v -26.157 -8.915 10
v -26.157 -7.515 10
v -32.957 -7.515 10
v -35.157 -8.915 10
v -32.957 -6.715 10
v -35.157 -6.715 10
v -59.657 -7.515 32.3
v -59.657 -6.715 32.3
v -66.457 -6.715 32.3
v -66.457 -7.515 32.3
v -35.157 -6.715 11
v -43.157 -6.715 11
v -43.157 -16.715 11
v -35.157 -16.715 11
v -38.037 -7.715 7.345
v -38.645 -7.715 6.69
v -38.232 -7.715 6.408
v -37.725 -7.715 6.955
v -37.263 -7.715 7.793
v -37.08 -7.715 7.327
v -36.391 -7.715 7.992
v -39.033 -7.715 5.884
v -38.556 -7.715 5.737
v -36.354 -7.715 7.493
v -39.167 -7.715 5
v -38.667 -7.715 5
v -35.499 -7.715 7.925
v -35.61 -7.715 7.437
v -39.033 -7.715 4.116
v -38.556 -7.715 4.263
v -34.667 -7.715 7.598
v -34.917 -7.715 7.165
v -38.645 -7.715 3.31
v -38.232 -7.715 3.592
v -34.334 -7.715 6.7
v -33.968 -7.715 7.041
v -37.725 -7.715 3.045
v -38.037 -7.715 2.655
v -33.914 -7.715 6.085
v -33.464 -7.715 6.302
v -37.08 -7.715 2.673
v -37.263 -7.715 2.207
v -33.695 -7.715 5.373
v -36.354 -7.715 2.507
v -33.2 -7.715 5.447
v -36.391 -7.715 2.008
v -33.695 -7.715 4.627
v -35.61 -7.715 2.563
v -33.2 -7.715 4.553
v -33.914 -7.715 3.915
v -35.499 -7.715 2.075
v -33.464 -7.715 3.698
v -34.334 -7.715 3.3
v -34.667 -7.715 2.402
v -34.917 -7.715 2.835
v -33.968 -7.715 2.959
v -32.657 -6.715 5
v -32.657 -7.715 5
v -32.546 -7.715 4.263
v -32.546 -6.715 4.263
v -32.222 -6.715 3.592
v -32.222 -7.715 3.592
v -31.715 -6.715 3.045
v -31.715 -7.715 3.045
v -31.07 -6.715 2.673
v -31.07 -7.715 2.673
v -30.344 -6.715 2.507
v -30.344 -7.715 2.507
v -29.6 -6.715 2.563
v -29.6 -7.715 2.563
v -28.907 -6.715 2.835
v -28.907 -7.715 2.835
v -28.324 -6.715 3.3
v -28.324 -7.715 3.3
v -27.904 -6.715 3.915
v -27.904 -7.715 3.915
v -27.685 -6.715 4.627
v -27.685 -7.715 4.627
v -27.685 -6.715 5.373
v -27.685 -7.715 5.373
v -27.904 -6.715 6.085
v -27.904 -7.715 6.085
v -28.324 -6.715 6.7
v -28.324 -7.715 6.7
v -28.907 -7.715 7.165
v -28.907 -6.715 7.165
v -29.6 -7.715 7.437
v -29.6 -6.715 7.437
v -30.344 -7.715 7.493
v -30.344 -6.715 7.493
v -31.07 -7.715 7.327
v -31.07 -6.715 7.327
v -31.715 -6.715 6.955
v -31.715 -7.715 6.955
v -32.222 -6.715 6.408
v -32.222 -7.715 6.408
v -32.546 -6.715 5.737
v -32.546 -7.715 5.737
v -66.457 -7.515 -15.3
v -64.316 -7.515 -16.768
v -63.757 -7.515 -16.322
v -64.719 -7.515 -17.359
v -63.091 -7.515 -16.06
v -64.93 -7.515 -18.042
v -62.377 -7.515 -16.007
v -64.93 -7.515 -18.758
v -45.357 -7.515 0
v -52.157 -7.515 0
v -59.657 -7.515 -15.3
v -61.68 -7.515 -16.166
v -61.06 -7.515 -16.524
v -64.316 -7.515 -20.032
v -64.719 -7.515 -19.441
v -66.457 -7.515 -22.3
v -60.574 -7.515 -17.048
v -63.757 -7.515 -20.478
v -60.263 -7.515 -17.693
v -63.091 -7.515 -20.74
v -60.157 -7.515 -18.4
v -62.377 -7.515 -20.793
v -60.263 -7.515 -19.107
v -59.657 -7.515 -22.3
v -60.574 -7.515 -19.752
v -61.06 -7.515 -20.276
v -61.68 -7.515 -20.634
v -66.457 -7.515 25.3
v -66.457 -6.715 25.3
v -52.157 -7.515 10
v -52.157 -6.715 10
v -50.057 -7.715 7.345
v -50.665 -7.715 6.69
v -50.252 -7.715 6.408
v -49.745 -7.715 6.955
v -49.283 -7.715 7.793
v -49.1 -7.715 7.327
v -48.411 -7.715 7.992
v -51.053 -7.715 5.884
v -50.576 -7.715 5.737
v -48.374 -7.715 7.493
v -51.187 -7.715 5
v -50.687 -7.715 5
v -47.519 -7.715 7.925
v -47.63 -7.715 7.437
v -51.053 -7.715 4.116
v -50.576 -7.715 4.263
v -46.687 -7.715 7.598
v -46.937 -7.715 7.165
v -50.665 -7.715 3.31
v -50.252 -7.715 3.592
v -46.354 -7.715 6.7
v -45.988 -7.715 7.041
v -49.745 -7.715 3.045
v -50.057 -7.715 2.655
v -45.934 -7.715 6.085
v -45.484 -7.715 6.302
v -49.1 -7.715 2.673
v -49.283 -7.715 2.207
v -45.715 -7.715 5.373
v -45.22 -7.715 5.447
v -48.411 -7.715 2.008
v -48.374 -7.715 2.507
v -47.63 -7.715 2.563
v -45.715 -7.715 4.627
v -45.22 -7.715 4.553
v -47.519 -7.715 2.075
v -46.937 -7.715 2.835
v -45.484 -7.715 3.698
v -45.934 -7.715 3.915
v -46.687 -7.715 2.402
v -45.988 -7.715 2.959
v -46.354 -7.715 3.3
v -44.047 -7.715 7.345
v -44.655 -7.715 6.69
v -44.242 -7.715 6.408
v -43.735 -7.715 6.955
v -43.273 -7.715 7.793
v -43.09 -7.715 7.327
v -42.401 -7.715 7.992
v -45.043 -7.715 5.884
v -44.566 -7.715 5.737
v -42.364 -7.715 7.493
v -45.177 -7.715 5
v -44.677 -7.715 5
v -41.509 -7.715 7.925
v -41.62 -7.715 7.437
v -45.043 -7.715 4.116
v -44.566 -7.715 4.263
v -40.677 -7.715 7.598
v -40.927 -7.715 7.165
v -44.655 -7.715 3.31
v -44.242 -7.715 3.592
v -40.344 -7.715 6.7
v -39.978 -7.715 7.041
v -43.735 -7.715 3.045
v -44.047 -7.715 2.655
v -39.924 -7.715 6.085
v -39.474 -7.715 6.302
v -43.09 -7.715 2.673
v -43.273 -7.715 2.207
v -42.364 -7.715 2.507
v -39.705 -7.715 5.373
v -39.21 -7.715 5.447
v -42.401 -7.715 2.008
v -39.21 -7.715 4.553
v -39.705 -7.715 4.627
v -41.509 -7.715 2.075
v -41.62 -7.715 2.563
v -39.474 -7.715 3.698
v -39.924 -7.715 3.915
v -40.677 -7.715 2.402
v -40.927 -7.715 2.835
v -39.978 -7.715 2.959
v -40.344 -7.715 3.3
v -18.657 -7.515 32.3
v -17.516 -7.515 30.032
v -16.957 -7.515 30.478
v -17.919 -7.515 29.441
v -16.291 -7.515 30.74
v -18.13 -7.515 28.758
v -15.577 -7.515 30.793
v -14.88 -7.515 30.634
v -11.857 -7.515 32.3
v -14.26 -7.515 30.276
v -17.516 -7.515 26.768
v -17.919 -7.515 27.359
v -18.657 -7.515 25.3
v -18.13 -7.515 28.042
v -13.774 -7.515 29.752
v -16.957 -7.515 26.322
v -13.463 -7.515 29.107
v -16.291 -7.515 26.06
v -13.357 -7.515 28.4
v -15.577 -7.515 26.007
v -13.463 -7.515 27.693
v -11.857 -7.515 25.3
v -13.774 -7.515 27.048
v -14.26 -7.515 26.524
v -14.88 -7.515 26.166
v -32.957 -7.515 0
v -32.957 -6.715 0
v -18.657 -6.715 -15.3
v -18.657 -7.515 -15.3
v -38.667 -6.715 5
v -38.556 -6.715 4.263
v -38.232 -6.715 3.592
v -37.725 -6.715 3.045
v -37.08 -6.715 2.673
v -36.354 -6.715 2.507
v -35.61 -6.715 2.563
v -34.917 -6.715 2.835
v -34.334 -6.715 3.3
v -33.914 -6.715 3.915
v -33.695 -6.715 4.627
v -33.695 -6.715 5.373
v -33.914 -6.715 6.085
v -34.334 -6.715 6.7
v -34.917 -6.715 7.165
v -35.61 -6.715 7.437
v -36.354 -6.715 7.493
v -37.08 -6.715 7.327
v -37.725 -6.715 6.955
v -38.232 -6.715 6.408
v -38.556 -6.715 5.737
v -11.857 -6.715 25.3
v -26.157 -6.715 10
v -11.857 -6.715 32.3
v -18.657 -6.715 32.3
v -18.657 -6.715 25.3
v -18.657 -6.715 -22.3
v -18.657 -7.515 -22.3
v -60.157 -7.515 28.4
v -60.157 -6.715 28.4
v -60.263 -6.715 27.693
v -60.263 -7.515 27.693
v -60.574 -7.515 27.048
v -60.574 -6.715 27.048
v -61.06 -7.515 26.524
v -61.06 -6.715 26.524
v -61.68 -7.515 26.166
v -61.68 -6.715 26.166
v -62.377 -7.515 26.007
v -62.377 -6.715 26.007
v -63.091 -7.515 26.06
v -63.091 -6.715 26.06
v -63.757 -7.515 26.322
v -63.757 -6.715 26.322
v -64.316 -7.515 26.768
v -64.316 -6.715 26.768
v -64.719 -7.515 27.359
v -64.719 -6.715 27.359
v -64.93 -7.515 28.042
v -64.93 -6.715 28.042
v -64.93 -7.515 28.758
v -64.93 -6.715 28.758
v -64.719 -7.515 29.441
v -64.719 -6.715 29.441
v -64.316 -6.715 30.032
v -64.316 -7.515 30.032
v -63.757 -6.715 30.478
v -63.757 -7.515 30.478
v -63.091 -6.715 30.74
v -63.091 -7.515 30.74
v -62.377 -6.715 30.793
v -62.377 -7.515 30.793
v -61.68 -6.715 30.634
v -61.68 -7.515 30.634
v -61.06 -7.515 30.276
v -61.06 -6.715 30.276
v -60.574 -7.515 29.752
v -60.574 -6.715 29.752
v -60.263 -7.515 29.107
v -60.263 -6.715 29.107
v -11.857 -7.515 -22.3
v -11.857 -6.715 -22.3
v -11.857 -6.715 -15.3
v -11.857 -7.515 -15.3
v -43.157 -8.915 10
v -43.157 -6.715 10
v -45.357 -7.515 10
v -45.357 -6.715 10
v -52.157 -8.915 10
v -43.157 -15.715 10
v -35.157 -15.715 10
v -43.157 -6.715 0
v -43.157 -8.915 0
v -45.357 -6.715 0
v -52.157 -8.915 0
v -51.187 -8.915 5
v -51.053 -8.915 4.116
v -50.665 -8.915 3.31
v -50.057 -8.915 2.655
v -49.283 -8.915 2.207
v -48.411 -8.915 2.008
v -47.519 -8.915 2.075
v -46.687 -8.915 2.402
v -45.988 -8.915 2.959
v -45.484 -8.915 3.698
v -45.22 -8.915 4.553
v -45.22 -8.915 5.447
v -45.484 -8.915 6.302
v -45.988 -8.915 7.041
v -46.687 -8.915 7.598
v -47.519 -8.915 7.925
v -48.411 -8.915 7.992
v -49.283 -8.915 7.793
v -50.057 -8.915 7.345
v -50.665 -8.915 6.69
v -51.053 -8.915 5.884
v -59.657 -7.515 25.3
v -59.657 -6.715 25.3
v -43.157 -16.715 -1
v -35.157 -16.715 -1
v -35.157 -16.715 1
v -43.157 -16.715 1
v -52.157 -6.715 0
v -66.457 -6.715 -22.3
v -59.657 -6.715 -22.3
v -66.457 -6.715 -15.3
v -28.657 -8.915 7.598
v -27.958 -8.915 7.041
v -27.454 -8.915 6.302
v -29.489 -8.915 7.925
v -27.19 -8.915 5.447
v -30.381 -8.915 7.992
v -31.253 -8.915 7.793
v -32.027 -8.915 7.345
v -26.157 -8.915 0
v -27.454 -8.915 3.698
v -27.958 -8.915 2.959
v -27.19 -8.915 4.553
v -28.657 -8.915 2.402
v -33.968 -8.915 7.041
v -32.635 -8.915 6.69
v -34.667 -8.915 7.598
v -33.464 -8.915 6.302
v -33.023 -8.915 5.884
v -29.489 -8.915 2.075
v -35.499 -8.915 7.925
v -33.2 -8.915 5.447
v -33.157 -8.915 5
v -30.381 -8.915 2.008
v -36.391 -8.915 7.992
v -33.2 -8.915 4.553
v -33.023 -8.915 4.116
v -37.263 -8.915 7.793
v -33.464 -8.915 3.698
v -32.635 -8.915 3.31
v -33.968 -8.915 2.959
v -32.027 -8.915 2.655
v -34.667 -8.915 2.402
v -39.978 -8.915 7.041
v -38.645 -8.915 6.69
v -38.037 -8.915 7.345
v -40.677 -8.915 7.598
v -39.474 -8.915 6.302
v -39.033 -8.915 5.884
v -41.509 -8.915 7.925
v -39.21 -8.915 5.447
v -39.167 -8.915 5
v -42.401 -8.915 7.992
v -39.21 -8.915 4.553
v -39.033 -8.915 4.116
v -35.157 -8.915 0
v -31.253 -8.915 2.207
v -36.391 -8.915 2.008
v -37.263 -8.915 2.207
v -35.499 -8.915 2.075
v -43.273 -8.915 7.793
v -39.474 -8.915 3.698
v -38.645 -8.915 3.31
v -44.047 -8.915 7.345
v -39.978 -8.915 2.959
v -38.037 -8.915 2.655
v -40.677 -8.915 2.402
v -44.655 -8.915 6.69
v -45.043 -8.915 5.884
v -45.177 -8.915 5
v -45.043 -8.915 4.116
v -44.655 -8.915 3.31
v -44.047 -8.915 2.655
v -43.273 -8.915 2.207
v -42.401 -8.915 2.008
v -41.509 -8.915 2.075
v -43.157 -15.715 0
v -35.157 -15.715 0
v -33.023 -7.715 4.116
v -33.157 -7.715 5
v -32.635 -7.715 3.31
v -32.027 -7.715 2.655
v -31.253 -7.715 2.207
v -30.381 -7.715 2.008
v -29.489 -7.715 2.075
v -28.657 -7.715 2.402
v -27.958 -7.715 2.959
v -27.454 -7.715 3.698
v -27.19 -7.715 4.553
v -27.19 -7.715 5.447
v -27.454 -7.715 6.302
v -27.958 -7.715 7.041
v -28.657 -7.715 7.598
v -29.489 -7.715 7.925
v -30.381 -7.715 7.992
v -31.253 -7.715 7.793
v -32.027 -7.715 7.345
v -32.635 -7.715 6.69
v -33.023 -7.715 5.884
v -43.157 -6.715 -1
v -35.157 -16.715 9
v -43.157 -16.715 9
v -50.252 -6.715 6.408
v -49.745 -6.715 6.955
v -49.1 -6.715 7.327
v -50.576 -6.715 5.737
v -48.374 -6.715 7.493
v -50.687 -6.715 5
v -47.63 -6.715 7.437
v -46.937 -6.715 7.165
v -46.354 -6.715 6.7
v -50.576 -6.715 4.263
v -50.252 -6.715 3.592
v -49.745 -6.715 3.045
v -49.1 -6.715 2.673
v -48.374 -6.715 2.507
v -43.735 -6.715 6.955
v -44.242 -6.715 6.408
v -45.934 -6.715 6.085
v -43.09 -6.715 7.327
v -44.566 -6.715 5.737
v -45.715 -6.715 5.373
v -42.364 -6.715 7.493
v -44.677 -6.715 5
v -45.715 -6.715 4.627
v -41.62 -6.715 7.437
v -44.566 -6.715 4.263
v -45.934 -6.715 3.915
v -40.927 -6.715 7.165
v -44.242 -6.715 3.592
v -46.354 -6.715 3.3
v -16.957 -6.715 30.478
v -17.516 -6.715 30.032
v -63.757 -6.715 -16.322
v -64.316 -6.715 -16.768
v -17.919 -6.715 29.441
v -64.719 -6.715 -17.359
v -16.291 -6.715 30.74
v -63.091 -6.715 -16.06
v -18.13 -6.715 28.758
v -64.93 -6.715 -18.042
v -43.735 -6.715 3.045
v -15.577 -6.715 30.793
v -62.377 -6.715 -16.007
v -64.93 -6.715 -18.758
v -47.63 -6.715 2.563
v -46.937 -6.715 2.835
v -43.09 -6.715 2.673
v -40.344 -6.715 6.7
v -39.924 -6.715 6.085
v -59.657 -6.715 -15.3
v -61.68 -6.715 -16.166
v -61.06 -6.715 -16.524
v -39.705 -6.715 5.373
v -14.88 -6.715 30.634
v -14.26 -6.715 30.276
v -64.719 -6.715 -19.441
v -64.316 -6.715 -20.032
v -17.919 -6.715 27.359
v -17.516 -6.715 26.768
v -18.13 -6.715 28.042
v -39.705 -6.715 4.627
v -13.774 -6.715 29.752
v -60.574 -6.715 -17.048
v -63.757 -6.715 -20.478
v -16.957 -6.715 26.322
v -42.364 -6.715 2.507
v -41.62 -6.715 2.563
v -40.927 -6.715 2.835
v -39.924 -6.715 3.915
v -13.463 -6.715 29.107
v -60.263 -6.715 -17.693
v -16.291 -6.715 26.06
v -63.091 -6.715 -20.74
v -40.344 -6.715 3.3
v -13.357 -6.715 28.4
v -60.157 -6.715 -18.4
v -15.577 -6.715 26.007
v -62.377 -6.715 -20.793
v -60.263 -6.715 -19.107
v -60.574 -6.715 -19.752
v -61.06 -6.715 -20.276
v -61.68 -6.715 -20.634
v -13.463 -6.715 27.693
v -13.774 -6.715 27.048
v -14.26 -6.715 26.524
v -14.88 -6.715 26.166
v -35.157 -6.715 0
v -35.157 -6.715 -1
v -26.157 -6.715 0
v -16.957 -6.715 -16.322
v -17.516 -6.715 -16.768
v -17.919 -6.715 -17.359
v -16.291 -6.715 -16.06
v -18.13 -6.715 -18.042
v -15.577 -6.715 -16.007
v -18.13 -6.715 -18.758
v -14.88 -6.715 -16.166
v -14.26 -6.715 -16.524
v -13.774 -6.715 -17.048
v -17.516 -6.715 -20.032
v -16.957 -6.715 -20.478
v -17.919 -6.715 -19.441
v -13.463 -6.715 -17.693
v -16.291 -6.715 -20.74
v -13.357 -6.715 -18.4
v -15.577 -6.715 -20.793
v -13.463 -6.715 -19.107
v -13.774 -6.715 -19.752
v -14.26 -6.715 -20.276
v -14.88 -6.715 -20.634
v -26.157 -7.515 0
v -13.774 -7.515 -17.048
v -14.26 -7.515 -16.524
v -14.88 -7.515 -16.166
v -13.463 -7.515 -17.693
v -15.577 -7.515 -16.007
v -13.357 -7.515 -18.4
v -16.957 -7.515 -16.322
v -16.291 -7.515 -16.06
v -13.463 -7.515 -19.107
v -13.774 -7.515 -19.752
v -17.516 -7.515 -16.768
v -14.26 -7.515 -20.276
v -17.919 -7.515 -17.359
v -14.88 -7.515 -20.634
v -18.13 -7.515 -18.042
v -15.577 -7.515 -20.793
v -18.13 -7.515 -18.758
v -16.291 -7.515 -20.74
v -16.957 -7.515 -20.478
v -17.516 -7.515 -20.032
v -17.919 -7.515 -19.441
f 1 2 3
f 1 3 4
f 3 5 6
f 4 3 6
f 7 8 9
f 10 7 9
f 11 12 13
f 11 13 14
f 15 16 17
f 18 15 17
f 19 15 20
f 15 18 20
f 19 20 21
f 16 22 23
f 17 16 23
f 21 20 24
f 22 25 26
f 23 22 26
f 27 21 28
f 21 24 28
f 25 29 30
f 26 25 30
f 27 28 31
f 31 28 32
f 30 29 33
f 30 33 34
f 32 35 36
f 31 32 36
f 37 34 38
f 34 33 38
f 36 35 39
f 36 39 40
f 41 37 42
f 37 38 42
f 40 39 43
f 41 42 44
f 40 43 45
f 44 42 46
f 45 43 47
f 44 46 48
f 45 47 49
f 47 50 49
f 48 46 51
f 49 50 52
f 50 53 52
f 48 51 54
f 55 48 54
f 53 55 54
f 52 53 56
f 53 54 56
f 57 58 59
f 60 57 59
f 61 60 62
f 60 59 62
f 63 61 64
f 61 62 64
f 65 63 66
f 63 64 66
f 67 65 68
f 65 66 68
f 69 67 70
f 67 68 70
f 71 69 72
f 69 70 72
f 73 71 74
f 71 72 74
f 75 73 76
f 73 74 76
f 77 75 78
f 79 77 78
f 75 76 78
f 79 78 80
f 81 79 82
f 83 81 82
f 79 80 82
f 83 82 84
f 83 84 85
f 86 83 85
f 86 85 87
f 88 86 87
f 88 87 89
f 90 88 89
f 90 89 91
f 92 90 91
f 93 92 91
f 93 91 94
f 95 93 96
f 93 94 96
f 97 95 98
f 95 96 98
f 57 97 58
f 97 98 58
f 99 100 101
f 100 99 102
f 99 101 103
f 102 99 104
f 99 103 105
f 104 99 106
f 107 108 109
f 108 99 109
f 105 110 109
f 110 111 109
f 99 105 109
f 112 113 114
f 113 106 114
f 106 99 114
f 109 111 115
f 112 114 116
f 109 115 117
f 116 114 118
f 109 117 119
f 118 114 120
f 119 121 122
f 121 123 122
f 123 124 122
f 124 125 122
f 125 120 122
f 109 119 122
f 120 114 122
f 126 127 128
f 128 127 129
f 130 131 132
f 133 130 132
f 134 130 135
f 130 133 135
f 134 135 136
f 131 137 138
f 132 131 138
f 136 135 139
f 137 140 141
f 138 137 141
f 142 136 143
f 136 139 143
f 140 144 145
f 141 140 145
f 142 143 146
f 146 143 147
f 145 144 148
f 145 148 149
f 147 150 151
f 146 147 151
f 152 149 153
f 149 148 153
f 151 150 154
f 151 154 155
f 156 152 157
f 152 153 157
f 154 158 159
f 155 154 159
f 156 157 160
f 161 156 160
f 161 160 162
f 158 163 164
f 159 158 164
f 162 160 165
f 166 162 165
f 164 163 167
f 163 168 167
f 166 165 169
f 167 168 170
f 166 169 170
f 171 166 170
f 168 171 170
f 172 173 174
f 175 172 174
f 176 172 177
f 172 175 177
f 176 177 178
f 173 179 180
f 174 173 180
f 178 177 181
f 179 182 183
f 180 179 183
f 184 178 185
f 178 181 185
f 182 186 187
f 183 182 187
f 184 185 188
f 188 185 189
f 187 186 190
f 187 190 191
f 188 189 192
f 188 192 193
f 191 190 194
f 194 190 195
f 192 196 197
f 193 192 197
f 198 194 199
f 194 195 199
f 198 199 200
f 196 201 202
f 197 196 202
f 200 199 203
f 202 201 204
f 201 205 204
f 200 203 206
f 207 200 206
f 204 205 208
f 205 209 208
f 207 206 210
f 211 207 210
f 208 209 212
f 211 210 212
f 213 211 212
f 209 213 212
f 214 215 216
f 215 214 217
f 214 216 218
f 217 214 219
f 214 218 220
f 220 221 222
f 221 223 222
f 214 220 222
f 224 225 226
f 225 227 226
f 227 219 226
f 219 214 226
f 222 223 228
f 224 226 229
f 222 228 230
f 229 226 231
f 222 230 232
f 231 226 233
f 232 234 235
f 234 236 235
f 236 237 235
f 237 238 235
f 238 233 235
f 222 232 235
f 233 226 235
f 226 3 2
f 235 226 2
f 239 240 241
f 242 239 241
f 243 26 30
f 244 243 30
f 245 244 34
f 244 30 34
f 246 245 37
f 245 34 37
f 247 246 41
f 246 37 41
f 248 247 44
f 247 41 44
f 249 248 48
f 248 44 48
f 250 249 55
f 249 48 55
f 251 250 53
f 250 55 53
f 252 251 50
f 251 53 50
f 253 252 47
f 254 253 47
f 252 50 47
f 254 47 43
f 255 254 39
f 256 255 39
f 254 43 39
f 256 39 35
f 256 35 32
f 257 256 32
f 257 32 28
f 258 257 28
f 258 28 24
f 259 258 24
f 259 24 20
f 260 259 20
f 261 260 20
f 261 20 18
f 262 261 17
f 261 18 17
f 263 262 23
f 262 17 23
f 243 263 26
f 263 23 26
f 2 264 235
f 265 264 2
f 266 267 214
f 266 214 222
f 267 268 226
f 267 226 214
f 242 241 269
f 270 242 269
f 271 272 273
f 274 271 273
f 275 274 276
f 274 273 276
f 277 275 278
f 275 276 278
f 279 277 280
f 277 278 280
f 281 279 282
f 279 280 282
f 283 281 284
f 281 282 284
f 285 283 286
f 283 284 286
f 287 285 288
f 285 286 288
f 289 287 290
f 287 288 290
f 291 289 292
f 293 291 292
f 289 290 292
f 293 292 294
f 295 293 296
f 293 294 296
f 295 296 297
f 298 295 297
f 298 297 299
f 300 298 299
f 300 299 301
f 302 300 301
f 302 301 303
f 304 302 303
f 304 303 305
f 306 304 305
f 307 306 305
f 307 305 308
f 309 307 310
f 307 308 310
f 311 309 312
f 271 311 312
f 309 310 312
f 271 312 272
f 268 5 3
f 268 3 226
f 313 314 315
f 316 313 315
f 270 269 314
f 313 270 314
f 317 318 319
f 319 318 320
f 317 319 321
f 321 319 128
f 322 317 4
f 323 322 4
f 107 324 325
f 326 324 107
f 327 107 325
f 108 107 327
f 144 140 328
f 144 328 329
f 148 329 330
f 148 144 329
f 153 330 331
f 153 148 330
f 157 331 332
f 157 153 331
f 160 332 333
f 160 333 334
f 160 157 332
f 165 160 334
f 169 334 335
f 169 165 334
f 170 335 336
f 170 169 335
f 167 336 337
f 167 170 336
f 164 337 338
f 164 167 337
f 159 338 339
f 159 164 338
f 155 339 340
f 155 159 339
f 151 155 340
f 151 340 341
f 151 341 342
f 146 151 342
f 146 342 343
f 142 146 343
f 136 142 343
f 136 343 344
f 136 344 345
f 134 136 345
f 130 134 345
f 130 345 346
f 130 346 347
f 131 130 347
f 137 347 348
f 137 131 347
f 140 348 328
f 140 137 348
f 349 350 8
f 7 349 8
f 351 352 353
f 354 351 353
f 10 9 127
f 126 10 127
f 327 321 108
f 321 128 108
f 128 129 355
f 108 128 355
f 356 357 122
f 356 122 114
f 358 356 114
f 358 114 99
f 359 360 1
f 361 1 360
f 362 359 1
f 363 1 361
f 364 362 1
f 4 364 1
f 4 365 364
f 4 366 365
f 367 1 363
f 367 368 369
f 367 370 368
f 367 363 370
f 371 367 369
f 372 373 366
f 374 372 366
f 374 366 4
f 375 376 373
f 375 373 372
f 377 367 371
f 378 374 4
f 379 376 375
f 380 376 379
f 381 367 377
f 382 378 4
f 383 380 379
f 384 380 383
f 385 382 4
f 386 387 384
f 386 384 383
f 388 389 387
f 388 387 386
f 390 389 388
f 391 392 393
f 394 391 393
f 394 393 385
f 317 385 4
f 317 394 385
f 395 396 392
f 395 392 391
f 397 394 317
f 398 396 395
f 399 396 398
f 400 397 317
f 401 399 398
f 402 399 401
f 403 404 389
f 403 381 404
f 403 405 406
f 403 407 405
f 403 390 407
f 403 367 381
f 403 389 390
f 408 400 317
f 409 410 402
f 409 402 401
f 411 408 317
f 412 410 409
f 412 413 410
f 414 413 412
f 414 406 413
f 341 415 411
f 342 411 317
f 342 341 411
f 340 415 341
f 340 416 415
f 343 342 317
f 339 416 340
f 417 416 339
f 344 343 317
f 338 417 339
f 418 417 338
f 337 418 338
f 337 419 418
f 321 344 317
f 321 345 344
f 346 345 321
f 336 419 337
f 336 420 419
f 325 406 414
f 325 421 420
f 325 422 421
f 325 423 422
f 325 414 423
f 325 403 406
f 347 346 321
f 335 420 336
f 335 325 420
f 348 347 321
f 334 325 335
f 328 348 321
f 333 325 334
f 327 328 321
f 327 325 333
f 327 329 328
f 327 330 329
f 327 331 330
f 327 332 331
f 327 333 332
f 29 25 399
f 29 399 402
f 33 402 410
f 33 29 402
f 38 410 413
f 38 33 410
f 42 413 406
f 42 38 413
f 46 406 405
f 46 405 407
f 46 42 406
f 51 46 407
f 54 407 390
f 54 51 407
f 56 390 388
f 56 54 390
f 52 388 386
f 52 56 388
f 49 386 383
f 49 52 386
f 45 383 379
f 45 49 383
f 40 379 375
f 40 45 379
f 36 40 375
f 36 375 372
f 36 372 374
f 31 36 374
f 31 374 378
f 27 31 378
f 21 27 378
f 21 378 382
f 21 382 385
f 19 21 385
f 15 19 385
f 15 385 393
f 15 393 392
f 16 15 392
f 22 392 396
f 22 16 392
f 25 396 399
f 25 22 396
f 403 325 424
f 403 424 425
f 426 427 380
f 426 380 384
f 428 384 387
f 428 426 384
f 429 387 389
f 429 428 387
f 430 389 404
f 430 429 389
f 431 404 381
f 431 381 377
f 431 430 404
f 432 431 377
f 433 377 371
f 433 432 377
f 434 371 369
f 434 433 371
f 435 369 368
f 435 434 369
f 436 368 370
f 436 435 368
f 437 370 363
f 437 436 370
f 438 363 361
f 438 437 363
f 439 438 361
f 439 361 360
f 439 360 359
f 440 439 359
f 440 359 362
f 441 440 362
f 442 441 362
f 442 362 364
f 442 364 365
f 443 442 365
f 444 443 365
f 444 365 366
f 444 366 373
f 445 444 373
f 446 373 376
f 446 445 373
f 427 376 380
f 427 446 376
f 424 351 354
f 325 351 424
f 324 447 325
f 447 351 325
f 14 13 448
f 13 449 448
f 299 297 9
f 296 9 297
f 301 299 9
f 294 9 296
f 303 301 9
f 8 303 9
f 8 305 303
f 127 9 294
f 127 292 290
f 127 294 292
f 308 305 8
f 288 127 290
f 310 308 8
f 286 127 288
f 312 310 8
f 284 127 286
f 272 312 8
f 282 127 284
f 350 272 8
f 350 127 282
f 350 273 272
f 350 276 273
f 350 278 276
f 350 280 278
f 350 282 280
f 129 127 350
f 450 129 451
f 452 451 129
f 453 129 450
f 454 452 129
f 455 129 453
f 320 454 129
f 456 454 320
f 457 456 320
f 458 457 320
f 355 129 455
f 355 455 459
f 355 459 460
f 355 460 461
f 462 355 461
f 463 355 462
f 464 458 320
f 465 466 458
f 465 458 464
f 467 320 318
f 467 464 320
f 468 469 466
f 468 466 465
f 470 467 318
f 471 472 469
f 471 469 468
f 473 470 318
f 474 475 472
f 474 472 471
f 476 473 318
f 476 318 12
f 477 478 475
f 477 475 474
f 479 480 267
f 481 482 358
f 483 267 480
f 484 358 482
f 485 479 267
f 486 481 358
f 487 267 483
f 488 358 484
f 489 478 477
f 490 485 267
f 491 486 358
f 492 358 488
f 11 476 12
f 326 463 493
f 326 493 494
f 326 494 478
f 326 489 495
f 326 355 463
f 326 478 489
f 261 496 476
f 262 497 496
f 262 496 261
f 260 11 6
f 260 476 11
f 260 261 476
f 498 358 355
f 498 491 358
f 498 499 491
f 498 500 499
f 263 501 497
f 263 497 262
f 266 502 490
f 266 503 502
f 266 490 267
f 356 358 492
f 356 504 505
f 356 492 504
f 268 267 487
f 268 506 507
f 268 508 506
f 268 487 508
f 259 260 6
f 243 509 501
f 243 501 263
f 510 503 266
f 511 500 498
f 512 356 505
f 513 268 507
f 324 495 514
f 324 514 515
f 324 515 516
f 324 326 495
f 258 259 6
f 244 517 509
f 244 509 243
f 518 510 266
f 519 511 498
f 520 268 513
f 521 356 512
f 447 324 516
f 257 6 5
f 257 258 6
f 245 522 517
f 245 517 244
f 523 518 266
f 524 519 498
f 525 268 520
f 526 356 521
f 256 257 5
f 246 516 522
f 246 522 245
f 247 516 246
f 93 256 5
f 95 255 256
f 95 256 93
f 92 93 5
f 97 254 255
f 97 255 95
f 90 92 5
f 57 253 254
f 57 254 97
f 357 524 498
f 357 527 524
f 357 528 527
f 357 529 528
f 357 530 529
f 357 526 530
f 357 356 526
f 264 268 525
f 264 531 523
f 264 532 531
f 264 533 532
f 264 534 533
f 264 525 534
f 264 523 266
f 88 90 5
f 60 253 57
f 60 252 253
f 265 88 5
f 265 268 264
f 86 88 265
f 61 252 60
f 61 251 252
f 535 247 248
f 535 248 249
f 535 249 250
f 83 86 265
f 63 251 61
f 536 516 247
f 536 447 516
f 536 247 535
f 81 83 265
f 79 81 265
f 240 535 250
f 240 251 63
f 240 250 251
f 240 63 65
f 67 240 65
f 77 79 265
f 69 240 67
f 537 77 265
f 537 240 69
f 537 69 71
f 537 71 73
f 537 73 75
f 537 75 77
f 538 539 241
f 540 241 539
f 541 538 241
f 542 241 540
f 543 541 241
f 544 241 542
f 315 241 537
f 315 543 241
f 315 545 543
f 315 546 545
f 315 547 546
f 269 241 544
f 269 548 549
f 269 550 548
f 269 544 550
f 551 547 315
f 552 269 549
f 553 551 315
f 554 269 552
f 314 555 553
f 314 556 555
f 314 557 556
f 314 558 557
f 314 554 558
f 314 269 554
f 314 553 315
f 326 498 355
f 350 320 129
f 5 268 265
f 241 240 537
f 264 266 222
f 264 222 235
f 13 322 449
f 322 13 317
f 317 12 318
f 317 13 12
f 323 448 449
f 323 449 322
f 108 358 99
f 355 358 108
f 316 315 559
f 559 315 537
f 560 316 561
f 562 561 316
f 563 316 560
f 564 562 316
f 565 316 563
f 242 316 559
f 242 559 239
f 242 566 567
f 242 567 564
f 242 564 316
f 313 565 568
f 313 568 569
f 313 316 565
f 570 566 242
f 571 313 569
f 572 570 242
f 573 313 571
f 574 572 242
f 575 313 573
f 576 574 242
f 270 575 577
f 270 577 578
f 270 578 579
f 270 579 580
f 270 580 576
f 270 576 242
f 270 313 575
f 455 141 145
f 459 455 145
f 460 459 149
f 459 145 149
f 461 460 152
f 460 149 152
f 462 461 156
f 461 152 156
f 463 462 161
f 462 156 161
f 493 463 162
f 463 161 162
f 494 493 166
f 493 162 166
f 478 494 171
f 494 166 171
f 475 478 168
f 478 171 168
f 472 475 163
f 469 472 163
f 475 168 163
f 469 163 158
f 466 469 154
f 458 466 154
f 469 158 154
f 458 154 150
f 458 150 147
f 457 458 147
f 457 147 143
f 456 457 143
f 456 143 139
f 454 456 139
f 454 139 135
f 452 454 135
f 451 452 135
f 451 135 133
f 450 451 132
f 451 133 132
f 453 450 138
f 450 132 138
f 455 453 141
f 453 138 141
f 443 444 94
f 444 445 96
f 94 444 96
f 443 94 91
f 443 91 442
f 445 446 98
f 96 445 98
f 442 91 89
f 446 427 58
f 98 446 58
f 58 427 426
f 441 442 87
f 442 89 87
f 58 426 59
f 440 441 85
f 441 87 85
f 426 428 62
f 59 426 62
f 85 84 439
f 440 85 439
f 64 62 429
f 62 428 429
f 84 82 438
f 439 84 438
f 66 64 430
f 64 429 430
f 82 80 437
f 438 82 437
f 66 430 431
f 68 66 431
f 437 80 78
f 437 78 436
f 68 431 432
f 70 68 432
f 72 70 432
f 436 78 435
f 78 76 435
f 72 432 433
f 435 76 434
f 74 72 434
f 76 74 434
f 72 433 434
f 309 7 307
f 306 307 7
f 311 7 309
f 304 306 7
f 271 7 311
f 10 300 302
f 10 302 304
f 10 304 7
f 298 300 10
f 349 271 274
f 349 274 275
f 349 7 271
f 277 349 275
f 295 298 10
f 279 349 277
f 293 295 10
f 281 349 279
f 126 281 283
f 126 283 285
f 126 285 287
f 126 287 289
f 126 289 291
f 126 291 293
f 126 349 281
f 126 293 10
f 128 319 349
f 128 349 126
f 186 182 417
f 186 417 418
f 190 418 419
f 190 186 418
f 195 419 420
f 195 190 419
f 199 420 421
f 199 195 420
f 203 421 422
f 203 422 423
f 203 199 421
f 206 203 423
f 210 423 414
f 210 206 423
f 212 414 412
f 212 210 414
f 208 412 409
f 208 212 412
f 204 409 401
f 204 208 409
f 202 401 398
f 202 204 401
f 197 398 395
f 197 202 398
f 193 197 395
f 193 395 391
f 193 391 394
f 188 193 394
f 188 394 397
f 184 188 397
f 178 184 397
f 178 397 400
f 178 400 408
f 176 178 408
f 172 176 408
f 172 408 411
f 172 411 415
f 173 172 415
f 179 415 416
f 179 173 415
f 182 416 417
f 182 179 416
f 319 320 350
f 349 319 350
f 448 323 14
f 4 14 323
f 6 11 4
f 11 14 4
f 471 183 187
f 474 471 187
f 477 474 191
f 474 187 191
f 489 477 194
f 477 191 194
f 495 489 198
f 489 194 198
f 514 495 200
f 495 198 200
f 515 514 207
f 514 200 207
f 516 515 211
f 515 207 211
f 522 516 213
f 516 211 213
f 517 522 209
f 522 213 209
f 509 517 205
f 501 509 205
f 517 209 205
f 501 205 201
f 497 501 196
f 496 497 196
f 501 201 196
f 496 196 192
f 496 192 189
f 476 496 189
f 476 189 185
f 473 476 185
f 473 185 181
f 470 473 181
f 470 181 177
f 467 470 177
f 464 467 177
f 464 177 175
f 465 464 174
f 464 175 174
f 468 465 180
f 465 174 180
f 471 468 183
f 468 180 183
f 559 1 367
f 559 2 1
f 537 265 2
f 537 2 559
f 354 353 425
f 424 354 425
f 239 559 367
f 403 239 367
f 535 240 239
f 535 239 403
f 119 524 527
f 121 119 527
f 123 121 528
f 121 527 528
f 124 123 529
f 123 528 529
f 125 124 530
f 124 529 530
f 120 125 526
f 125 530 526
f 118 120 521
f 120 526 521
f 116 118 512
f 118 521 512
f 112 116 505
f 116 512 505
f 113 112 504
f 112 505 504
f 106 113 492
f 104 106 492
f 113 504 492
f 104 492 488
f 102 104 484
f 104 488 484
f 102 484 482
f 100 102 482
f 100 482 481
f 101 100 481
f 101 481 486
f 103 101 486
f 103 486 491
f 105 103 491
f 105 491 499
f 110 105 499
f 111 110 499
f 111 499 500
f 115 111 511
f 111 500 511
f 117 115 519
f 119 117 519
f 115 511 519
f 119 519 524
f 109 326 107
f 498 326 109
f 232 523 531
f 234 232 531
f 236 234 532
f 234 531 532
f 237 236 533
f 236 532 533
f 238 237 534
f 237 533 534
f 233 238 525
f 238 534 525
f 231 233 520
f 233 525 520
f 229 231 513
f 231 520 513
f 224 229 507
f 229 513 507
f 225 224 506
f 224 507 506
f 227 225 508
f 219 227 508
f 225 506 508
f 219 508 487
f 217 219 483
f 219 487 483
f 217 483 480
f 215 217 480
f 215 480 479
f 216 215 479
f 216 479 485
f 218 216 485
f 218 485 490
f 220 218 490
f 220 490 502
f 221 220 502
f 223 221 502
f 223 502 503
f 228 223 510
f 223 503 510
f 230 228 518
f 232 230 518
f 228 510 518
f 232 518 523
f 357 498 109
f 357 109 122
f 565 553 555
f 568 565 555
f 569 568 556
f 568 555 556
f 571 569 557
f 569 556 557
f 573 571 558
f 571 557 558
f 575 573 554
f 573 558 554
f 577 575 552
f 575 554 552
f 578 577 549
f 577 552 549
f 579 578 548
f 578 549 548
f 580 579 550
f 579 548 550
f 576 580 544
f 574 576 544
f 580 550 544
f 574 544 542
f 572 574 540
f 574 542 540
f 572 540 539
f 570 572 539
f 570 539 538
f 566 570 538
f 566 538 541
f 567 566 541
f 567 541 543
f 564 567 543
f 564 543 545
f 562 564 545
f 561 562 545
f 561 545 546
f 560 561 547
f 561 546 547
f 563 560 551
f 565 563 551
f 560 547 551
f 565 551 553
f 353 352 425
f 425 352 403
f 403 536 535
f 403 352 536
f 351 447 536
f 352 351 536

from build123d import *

# Parameters (mm, degrees)
SKICA1_W                 = 26
SKICA1_H                 = 1
P_IDAT_VYSUNUT_M1_DEPTH  = 10
SKICA2_R                 = 2.5
ODEBRAT_VYSUNUT_M1_DEPTH = 1
SKICA3_R                 = 2.4
P_IDAT_VYSUNUT_M2_DEPTH  = 0.8
SKICA4_W                 = 26
SKICA4_H                 = 10
SKICA4_R                 = 3
P_IDAT_VYSUNUT_M3_DEPTH  = 1.2
SKICA6_W                 = 8
SKICA6_H                 = 1
P_IDAT_VYSUNUT_M5_DEPTH  = 10
P_IDAT_VYSUNUT_M6_DEPTH  = 8


with BuildPart() as part:
    # Skica1 → Přidat vysunutím1 (new body)
    with BuildSketch(Plane.XY):
        with Locations((-39.156744291, -7.214704976)):
            Rectangle(SKICA1_W, SKICA1_H)
    extrude(amount=P_IDAT_VYSUNUT_M1_DEPTH)

    # Skica2 → Odebrat vysunutím1 (cut)
    with BuildSketch(Plane(origin=(0, -7.714704976, 0), x_dir=(-1, 0, 0), z_dir=(0, -1, 0))):
        with Locations((48.186744291, -5)):
            Circle(SKICA2_R)
        with Locations((42.176744291, -5)):
            Circle(SKICA2_R)
        with Locations((36.166744291, -5)):
            Circle(SKICA2_R)
        with Locations((30.156744291, -5)):
            Circle(SKICA2_R)
    extrude(amount=-ODEBRAT_VYSUNUT_M1_DEPTH, mode=Mode.SUBTRACT)

    # Skica3 → Přidat vysunutím2 (add)
    with BuildSketch(Plane(origin=(0, -6.714704976, 0), x_dir=(1, 0, 0), z_dir=(0, 1, 0))):
        Polygon((-32.956744291, 0), (-18.656744291, 15.3), (-18.656744291, 22.3), (-11.856744291, 22.3), (-11.856744291, 15.3), (-26.156744291, 0), align=None)
        with Locations((-15.756744291, 18.4)):
            Circle(SKICA3_R, mode=Mode.SUBTRACT)
        Polygon((-52.156744291, 0), (-45.356744291, 0), (-59.656744291, 15.3), (-59.656744291, 22.3), (-66.456744291, 22.3), (-66.456744291, 15.3), align=None)
        with Locations((-62.556744291, 18.4)):
            Circle(SKICA3_R, mode=Mode.SUBTRACT)
        Polygon((-45.356744291, -10), (-59.656744291, -25.3), (-59.656744291, -32.3), (-66.456744291, -32.3), (-66.456744291, -25.3), (-52.156744291, -10), align=None)
        with Locations((-62.556744291, -28.4)):
            Circle(SKICA3_R, mode=Mode.SUBTRACT)
        Polygon((-26.156744291, -10), (-32.956744291, -10), (-18.656744291, -25.3), (-18.656744291, -32.3), (-11.856744291, -32.3), (-11.856744291, -25.3), align=None)
        with Locations((-15.756744291, -28.4)):
            Circle(SKICA3_R, mode=Mode.SUBTRACT)
    extrude(amount=-P_IDAT_VYSUNUT_M2_DEPTH)

    # Skica4 → Přidat vysunutím3 (add)
    with BuildSketch(Plane(origin=(0, -7.714704976, 0), x_dir=(-1, 0, 0), z_dir=(0, -1, 0))):
        with Locations((39.156744291, -5)):
            Rectangle(SKICA4_W, SKICA4_H)
        with Locations((48.186744291, -5)):
            Circle(SKICA4_R, mode=Mode.SUBTRACT)
        with Locations((42.176744291, -5)):
            Circle(SKICA4_R, mode=Mode.SUBTRACT)
        with Locations((36.166744291, -5)):
            Circle(SKICA4_R, mode=Mode.SUBTRACT)
        with Locations((30.156744291, -5)):
            Circle(SKICA4_R, mode=Mode.SUBTRACT)
    extrude(amount=P_IDAT_VYSUNUT_M3_DEPTH)

    # Skica6 → Přidat vysunutím5 (add)
    with BuildSketch(Plane(origin=(0, -6.714704976, 0), x_dir=(1, 0, 0), z_dir=(0, 1, 0))):
        with Locations((-39.156744291, 0.5)):
            Rectangle(SKICA6_W, SKICA6_H)
        with Locations((-39.156744291, -10.5)):
            Rectangle(SKICA6_W, SKICA6_H)
    extrude(amount=-P_IDAT_VYSUNUT_M5_DEPTH)

    # Skica7 → Přidat vysunutím6 (add)
    with BuildSketch(Plane(origin=(-35.156744291, 0, 0), x_dir=(0, 0, -1), z_dir=(1, 0, 0))):
        Polygon((0, -16.714704976), (-1, -16.714704976), (0, -15.714704976), align=None)
        Polygon((-10, -16.714704976), (-9, -16.714704976), (-10, -15.714704976), align=None)
    extrude(amount=-P_IDAT_VYSUNUT_M6_DEPTH)


solid = part.part
